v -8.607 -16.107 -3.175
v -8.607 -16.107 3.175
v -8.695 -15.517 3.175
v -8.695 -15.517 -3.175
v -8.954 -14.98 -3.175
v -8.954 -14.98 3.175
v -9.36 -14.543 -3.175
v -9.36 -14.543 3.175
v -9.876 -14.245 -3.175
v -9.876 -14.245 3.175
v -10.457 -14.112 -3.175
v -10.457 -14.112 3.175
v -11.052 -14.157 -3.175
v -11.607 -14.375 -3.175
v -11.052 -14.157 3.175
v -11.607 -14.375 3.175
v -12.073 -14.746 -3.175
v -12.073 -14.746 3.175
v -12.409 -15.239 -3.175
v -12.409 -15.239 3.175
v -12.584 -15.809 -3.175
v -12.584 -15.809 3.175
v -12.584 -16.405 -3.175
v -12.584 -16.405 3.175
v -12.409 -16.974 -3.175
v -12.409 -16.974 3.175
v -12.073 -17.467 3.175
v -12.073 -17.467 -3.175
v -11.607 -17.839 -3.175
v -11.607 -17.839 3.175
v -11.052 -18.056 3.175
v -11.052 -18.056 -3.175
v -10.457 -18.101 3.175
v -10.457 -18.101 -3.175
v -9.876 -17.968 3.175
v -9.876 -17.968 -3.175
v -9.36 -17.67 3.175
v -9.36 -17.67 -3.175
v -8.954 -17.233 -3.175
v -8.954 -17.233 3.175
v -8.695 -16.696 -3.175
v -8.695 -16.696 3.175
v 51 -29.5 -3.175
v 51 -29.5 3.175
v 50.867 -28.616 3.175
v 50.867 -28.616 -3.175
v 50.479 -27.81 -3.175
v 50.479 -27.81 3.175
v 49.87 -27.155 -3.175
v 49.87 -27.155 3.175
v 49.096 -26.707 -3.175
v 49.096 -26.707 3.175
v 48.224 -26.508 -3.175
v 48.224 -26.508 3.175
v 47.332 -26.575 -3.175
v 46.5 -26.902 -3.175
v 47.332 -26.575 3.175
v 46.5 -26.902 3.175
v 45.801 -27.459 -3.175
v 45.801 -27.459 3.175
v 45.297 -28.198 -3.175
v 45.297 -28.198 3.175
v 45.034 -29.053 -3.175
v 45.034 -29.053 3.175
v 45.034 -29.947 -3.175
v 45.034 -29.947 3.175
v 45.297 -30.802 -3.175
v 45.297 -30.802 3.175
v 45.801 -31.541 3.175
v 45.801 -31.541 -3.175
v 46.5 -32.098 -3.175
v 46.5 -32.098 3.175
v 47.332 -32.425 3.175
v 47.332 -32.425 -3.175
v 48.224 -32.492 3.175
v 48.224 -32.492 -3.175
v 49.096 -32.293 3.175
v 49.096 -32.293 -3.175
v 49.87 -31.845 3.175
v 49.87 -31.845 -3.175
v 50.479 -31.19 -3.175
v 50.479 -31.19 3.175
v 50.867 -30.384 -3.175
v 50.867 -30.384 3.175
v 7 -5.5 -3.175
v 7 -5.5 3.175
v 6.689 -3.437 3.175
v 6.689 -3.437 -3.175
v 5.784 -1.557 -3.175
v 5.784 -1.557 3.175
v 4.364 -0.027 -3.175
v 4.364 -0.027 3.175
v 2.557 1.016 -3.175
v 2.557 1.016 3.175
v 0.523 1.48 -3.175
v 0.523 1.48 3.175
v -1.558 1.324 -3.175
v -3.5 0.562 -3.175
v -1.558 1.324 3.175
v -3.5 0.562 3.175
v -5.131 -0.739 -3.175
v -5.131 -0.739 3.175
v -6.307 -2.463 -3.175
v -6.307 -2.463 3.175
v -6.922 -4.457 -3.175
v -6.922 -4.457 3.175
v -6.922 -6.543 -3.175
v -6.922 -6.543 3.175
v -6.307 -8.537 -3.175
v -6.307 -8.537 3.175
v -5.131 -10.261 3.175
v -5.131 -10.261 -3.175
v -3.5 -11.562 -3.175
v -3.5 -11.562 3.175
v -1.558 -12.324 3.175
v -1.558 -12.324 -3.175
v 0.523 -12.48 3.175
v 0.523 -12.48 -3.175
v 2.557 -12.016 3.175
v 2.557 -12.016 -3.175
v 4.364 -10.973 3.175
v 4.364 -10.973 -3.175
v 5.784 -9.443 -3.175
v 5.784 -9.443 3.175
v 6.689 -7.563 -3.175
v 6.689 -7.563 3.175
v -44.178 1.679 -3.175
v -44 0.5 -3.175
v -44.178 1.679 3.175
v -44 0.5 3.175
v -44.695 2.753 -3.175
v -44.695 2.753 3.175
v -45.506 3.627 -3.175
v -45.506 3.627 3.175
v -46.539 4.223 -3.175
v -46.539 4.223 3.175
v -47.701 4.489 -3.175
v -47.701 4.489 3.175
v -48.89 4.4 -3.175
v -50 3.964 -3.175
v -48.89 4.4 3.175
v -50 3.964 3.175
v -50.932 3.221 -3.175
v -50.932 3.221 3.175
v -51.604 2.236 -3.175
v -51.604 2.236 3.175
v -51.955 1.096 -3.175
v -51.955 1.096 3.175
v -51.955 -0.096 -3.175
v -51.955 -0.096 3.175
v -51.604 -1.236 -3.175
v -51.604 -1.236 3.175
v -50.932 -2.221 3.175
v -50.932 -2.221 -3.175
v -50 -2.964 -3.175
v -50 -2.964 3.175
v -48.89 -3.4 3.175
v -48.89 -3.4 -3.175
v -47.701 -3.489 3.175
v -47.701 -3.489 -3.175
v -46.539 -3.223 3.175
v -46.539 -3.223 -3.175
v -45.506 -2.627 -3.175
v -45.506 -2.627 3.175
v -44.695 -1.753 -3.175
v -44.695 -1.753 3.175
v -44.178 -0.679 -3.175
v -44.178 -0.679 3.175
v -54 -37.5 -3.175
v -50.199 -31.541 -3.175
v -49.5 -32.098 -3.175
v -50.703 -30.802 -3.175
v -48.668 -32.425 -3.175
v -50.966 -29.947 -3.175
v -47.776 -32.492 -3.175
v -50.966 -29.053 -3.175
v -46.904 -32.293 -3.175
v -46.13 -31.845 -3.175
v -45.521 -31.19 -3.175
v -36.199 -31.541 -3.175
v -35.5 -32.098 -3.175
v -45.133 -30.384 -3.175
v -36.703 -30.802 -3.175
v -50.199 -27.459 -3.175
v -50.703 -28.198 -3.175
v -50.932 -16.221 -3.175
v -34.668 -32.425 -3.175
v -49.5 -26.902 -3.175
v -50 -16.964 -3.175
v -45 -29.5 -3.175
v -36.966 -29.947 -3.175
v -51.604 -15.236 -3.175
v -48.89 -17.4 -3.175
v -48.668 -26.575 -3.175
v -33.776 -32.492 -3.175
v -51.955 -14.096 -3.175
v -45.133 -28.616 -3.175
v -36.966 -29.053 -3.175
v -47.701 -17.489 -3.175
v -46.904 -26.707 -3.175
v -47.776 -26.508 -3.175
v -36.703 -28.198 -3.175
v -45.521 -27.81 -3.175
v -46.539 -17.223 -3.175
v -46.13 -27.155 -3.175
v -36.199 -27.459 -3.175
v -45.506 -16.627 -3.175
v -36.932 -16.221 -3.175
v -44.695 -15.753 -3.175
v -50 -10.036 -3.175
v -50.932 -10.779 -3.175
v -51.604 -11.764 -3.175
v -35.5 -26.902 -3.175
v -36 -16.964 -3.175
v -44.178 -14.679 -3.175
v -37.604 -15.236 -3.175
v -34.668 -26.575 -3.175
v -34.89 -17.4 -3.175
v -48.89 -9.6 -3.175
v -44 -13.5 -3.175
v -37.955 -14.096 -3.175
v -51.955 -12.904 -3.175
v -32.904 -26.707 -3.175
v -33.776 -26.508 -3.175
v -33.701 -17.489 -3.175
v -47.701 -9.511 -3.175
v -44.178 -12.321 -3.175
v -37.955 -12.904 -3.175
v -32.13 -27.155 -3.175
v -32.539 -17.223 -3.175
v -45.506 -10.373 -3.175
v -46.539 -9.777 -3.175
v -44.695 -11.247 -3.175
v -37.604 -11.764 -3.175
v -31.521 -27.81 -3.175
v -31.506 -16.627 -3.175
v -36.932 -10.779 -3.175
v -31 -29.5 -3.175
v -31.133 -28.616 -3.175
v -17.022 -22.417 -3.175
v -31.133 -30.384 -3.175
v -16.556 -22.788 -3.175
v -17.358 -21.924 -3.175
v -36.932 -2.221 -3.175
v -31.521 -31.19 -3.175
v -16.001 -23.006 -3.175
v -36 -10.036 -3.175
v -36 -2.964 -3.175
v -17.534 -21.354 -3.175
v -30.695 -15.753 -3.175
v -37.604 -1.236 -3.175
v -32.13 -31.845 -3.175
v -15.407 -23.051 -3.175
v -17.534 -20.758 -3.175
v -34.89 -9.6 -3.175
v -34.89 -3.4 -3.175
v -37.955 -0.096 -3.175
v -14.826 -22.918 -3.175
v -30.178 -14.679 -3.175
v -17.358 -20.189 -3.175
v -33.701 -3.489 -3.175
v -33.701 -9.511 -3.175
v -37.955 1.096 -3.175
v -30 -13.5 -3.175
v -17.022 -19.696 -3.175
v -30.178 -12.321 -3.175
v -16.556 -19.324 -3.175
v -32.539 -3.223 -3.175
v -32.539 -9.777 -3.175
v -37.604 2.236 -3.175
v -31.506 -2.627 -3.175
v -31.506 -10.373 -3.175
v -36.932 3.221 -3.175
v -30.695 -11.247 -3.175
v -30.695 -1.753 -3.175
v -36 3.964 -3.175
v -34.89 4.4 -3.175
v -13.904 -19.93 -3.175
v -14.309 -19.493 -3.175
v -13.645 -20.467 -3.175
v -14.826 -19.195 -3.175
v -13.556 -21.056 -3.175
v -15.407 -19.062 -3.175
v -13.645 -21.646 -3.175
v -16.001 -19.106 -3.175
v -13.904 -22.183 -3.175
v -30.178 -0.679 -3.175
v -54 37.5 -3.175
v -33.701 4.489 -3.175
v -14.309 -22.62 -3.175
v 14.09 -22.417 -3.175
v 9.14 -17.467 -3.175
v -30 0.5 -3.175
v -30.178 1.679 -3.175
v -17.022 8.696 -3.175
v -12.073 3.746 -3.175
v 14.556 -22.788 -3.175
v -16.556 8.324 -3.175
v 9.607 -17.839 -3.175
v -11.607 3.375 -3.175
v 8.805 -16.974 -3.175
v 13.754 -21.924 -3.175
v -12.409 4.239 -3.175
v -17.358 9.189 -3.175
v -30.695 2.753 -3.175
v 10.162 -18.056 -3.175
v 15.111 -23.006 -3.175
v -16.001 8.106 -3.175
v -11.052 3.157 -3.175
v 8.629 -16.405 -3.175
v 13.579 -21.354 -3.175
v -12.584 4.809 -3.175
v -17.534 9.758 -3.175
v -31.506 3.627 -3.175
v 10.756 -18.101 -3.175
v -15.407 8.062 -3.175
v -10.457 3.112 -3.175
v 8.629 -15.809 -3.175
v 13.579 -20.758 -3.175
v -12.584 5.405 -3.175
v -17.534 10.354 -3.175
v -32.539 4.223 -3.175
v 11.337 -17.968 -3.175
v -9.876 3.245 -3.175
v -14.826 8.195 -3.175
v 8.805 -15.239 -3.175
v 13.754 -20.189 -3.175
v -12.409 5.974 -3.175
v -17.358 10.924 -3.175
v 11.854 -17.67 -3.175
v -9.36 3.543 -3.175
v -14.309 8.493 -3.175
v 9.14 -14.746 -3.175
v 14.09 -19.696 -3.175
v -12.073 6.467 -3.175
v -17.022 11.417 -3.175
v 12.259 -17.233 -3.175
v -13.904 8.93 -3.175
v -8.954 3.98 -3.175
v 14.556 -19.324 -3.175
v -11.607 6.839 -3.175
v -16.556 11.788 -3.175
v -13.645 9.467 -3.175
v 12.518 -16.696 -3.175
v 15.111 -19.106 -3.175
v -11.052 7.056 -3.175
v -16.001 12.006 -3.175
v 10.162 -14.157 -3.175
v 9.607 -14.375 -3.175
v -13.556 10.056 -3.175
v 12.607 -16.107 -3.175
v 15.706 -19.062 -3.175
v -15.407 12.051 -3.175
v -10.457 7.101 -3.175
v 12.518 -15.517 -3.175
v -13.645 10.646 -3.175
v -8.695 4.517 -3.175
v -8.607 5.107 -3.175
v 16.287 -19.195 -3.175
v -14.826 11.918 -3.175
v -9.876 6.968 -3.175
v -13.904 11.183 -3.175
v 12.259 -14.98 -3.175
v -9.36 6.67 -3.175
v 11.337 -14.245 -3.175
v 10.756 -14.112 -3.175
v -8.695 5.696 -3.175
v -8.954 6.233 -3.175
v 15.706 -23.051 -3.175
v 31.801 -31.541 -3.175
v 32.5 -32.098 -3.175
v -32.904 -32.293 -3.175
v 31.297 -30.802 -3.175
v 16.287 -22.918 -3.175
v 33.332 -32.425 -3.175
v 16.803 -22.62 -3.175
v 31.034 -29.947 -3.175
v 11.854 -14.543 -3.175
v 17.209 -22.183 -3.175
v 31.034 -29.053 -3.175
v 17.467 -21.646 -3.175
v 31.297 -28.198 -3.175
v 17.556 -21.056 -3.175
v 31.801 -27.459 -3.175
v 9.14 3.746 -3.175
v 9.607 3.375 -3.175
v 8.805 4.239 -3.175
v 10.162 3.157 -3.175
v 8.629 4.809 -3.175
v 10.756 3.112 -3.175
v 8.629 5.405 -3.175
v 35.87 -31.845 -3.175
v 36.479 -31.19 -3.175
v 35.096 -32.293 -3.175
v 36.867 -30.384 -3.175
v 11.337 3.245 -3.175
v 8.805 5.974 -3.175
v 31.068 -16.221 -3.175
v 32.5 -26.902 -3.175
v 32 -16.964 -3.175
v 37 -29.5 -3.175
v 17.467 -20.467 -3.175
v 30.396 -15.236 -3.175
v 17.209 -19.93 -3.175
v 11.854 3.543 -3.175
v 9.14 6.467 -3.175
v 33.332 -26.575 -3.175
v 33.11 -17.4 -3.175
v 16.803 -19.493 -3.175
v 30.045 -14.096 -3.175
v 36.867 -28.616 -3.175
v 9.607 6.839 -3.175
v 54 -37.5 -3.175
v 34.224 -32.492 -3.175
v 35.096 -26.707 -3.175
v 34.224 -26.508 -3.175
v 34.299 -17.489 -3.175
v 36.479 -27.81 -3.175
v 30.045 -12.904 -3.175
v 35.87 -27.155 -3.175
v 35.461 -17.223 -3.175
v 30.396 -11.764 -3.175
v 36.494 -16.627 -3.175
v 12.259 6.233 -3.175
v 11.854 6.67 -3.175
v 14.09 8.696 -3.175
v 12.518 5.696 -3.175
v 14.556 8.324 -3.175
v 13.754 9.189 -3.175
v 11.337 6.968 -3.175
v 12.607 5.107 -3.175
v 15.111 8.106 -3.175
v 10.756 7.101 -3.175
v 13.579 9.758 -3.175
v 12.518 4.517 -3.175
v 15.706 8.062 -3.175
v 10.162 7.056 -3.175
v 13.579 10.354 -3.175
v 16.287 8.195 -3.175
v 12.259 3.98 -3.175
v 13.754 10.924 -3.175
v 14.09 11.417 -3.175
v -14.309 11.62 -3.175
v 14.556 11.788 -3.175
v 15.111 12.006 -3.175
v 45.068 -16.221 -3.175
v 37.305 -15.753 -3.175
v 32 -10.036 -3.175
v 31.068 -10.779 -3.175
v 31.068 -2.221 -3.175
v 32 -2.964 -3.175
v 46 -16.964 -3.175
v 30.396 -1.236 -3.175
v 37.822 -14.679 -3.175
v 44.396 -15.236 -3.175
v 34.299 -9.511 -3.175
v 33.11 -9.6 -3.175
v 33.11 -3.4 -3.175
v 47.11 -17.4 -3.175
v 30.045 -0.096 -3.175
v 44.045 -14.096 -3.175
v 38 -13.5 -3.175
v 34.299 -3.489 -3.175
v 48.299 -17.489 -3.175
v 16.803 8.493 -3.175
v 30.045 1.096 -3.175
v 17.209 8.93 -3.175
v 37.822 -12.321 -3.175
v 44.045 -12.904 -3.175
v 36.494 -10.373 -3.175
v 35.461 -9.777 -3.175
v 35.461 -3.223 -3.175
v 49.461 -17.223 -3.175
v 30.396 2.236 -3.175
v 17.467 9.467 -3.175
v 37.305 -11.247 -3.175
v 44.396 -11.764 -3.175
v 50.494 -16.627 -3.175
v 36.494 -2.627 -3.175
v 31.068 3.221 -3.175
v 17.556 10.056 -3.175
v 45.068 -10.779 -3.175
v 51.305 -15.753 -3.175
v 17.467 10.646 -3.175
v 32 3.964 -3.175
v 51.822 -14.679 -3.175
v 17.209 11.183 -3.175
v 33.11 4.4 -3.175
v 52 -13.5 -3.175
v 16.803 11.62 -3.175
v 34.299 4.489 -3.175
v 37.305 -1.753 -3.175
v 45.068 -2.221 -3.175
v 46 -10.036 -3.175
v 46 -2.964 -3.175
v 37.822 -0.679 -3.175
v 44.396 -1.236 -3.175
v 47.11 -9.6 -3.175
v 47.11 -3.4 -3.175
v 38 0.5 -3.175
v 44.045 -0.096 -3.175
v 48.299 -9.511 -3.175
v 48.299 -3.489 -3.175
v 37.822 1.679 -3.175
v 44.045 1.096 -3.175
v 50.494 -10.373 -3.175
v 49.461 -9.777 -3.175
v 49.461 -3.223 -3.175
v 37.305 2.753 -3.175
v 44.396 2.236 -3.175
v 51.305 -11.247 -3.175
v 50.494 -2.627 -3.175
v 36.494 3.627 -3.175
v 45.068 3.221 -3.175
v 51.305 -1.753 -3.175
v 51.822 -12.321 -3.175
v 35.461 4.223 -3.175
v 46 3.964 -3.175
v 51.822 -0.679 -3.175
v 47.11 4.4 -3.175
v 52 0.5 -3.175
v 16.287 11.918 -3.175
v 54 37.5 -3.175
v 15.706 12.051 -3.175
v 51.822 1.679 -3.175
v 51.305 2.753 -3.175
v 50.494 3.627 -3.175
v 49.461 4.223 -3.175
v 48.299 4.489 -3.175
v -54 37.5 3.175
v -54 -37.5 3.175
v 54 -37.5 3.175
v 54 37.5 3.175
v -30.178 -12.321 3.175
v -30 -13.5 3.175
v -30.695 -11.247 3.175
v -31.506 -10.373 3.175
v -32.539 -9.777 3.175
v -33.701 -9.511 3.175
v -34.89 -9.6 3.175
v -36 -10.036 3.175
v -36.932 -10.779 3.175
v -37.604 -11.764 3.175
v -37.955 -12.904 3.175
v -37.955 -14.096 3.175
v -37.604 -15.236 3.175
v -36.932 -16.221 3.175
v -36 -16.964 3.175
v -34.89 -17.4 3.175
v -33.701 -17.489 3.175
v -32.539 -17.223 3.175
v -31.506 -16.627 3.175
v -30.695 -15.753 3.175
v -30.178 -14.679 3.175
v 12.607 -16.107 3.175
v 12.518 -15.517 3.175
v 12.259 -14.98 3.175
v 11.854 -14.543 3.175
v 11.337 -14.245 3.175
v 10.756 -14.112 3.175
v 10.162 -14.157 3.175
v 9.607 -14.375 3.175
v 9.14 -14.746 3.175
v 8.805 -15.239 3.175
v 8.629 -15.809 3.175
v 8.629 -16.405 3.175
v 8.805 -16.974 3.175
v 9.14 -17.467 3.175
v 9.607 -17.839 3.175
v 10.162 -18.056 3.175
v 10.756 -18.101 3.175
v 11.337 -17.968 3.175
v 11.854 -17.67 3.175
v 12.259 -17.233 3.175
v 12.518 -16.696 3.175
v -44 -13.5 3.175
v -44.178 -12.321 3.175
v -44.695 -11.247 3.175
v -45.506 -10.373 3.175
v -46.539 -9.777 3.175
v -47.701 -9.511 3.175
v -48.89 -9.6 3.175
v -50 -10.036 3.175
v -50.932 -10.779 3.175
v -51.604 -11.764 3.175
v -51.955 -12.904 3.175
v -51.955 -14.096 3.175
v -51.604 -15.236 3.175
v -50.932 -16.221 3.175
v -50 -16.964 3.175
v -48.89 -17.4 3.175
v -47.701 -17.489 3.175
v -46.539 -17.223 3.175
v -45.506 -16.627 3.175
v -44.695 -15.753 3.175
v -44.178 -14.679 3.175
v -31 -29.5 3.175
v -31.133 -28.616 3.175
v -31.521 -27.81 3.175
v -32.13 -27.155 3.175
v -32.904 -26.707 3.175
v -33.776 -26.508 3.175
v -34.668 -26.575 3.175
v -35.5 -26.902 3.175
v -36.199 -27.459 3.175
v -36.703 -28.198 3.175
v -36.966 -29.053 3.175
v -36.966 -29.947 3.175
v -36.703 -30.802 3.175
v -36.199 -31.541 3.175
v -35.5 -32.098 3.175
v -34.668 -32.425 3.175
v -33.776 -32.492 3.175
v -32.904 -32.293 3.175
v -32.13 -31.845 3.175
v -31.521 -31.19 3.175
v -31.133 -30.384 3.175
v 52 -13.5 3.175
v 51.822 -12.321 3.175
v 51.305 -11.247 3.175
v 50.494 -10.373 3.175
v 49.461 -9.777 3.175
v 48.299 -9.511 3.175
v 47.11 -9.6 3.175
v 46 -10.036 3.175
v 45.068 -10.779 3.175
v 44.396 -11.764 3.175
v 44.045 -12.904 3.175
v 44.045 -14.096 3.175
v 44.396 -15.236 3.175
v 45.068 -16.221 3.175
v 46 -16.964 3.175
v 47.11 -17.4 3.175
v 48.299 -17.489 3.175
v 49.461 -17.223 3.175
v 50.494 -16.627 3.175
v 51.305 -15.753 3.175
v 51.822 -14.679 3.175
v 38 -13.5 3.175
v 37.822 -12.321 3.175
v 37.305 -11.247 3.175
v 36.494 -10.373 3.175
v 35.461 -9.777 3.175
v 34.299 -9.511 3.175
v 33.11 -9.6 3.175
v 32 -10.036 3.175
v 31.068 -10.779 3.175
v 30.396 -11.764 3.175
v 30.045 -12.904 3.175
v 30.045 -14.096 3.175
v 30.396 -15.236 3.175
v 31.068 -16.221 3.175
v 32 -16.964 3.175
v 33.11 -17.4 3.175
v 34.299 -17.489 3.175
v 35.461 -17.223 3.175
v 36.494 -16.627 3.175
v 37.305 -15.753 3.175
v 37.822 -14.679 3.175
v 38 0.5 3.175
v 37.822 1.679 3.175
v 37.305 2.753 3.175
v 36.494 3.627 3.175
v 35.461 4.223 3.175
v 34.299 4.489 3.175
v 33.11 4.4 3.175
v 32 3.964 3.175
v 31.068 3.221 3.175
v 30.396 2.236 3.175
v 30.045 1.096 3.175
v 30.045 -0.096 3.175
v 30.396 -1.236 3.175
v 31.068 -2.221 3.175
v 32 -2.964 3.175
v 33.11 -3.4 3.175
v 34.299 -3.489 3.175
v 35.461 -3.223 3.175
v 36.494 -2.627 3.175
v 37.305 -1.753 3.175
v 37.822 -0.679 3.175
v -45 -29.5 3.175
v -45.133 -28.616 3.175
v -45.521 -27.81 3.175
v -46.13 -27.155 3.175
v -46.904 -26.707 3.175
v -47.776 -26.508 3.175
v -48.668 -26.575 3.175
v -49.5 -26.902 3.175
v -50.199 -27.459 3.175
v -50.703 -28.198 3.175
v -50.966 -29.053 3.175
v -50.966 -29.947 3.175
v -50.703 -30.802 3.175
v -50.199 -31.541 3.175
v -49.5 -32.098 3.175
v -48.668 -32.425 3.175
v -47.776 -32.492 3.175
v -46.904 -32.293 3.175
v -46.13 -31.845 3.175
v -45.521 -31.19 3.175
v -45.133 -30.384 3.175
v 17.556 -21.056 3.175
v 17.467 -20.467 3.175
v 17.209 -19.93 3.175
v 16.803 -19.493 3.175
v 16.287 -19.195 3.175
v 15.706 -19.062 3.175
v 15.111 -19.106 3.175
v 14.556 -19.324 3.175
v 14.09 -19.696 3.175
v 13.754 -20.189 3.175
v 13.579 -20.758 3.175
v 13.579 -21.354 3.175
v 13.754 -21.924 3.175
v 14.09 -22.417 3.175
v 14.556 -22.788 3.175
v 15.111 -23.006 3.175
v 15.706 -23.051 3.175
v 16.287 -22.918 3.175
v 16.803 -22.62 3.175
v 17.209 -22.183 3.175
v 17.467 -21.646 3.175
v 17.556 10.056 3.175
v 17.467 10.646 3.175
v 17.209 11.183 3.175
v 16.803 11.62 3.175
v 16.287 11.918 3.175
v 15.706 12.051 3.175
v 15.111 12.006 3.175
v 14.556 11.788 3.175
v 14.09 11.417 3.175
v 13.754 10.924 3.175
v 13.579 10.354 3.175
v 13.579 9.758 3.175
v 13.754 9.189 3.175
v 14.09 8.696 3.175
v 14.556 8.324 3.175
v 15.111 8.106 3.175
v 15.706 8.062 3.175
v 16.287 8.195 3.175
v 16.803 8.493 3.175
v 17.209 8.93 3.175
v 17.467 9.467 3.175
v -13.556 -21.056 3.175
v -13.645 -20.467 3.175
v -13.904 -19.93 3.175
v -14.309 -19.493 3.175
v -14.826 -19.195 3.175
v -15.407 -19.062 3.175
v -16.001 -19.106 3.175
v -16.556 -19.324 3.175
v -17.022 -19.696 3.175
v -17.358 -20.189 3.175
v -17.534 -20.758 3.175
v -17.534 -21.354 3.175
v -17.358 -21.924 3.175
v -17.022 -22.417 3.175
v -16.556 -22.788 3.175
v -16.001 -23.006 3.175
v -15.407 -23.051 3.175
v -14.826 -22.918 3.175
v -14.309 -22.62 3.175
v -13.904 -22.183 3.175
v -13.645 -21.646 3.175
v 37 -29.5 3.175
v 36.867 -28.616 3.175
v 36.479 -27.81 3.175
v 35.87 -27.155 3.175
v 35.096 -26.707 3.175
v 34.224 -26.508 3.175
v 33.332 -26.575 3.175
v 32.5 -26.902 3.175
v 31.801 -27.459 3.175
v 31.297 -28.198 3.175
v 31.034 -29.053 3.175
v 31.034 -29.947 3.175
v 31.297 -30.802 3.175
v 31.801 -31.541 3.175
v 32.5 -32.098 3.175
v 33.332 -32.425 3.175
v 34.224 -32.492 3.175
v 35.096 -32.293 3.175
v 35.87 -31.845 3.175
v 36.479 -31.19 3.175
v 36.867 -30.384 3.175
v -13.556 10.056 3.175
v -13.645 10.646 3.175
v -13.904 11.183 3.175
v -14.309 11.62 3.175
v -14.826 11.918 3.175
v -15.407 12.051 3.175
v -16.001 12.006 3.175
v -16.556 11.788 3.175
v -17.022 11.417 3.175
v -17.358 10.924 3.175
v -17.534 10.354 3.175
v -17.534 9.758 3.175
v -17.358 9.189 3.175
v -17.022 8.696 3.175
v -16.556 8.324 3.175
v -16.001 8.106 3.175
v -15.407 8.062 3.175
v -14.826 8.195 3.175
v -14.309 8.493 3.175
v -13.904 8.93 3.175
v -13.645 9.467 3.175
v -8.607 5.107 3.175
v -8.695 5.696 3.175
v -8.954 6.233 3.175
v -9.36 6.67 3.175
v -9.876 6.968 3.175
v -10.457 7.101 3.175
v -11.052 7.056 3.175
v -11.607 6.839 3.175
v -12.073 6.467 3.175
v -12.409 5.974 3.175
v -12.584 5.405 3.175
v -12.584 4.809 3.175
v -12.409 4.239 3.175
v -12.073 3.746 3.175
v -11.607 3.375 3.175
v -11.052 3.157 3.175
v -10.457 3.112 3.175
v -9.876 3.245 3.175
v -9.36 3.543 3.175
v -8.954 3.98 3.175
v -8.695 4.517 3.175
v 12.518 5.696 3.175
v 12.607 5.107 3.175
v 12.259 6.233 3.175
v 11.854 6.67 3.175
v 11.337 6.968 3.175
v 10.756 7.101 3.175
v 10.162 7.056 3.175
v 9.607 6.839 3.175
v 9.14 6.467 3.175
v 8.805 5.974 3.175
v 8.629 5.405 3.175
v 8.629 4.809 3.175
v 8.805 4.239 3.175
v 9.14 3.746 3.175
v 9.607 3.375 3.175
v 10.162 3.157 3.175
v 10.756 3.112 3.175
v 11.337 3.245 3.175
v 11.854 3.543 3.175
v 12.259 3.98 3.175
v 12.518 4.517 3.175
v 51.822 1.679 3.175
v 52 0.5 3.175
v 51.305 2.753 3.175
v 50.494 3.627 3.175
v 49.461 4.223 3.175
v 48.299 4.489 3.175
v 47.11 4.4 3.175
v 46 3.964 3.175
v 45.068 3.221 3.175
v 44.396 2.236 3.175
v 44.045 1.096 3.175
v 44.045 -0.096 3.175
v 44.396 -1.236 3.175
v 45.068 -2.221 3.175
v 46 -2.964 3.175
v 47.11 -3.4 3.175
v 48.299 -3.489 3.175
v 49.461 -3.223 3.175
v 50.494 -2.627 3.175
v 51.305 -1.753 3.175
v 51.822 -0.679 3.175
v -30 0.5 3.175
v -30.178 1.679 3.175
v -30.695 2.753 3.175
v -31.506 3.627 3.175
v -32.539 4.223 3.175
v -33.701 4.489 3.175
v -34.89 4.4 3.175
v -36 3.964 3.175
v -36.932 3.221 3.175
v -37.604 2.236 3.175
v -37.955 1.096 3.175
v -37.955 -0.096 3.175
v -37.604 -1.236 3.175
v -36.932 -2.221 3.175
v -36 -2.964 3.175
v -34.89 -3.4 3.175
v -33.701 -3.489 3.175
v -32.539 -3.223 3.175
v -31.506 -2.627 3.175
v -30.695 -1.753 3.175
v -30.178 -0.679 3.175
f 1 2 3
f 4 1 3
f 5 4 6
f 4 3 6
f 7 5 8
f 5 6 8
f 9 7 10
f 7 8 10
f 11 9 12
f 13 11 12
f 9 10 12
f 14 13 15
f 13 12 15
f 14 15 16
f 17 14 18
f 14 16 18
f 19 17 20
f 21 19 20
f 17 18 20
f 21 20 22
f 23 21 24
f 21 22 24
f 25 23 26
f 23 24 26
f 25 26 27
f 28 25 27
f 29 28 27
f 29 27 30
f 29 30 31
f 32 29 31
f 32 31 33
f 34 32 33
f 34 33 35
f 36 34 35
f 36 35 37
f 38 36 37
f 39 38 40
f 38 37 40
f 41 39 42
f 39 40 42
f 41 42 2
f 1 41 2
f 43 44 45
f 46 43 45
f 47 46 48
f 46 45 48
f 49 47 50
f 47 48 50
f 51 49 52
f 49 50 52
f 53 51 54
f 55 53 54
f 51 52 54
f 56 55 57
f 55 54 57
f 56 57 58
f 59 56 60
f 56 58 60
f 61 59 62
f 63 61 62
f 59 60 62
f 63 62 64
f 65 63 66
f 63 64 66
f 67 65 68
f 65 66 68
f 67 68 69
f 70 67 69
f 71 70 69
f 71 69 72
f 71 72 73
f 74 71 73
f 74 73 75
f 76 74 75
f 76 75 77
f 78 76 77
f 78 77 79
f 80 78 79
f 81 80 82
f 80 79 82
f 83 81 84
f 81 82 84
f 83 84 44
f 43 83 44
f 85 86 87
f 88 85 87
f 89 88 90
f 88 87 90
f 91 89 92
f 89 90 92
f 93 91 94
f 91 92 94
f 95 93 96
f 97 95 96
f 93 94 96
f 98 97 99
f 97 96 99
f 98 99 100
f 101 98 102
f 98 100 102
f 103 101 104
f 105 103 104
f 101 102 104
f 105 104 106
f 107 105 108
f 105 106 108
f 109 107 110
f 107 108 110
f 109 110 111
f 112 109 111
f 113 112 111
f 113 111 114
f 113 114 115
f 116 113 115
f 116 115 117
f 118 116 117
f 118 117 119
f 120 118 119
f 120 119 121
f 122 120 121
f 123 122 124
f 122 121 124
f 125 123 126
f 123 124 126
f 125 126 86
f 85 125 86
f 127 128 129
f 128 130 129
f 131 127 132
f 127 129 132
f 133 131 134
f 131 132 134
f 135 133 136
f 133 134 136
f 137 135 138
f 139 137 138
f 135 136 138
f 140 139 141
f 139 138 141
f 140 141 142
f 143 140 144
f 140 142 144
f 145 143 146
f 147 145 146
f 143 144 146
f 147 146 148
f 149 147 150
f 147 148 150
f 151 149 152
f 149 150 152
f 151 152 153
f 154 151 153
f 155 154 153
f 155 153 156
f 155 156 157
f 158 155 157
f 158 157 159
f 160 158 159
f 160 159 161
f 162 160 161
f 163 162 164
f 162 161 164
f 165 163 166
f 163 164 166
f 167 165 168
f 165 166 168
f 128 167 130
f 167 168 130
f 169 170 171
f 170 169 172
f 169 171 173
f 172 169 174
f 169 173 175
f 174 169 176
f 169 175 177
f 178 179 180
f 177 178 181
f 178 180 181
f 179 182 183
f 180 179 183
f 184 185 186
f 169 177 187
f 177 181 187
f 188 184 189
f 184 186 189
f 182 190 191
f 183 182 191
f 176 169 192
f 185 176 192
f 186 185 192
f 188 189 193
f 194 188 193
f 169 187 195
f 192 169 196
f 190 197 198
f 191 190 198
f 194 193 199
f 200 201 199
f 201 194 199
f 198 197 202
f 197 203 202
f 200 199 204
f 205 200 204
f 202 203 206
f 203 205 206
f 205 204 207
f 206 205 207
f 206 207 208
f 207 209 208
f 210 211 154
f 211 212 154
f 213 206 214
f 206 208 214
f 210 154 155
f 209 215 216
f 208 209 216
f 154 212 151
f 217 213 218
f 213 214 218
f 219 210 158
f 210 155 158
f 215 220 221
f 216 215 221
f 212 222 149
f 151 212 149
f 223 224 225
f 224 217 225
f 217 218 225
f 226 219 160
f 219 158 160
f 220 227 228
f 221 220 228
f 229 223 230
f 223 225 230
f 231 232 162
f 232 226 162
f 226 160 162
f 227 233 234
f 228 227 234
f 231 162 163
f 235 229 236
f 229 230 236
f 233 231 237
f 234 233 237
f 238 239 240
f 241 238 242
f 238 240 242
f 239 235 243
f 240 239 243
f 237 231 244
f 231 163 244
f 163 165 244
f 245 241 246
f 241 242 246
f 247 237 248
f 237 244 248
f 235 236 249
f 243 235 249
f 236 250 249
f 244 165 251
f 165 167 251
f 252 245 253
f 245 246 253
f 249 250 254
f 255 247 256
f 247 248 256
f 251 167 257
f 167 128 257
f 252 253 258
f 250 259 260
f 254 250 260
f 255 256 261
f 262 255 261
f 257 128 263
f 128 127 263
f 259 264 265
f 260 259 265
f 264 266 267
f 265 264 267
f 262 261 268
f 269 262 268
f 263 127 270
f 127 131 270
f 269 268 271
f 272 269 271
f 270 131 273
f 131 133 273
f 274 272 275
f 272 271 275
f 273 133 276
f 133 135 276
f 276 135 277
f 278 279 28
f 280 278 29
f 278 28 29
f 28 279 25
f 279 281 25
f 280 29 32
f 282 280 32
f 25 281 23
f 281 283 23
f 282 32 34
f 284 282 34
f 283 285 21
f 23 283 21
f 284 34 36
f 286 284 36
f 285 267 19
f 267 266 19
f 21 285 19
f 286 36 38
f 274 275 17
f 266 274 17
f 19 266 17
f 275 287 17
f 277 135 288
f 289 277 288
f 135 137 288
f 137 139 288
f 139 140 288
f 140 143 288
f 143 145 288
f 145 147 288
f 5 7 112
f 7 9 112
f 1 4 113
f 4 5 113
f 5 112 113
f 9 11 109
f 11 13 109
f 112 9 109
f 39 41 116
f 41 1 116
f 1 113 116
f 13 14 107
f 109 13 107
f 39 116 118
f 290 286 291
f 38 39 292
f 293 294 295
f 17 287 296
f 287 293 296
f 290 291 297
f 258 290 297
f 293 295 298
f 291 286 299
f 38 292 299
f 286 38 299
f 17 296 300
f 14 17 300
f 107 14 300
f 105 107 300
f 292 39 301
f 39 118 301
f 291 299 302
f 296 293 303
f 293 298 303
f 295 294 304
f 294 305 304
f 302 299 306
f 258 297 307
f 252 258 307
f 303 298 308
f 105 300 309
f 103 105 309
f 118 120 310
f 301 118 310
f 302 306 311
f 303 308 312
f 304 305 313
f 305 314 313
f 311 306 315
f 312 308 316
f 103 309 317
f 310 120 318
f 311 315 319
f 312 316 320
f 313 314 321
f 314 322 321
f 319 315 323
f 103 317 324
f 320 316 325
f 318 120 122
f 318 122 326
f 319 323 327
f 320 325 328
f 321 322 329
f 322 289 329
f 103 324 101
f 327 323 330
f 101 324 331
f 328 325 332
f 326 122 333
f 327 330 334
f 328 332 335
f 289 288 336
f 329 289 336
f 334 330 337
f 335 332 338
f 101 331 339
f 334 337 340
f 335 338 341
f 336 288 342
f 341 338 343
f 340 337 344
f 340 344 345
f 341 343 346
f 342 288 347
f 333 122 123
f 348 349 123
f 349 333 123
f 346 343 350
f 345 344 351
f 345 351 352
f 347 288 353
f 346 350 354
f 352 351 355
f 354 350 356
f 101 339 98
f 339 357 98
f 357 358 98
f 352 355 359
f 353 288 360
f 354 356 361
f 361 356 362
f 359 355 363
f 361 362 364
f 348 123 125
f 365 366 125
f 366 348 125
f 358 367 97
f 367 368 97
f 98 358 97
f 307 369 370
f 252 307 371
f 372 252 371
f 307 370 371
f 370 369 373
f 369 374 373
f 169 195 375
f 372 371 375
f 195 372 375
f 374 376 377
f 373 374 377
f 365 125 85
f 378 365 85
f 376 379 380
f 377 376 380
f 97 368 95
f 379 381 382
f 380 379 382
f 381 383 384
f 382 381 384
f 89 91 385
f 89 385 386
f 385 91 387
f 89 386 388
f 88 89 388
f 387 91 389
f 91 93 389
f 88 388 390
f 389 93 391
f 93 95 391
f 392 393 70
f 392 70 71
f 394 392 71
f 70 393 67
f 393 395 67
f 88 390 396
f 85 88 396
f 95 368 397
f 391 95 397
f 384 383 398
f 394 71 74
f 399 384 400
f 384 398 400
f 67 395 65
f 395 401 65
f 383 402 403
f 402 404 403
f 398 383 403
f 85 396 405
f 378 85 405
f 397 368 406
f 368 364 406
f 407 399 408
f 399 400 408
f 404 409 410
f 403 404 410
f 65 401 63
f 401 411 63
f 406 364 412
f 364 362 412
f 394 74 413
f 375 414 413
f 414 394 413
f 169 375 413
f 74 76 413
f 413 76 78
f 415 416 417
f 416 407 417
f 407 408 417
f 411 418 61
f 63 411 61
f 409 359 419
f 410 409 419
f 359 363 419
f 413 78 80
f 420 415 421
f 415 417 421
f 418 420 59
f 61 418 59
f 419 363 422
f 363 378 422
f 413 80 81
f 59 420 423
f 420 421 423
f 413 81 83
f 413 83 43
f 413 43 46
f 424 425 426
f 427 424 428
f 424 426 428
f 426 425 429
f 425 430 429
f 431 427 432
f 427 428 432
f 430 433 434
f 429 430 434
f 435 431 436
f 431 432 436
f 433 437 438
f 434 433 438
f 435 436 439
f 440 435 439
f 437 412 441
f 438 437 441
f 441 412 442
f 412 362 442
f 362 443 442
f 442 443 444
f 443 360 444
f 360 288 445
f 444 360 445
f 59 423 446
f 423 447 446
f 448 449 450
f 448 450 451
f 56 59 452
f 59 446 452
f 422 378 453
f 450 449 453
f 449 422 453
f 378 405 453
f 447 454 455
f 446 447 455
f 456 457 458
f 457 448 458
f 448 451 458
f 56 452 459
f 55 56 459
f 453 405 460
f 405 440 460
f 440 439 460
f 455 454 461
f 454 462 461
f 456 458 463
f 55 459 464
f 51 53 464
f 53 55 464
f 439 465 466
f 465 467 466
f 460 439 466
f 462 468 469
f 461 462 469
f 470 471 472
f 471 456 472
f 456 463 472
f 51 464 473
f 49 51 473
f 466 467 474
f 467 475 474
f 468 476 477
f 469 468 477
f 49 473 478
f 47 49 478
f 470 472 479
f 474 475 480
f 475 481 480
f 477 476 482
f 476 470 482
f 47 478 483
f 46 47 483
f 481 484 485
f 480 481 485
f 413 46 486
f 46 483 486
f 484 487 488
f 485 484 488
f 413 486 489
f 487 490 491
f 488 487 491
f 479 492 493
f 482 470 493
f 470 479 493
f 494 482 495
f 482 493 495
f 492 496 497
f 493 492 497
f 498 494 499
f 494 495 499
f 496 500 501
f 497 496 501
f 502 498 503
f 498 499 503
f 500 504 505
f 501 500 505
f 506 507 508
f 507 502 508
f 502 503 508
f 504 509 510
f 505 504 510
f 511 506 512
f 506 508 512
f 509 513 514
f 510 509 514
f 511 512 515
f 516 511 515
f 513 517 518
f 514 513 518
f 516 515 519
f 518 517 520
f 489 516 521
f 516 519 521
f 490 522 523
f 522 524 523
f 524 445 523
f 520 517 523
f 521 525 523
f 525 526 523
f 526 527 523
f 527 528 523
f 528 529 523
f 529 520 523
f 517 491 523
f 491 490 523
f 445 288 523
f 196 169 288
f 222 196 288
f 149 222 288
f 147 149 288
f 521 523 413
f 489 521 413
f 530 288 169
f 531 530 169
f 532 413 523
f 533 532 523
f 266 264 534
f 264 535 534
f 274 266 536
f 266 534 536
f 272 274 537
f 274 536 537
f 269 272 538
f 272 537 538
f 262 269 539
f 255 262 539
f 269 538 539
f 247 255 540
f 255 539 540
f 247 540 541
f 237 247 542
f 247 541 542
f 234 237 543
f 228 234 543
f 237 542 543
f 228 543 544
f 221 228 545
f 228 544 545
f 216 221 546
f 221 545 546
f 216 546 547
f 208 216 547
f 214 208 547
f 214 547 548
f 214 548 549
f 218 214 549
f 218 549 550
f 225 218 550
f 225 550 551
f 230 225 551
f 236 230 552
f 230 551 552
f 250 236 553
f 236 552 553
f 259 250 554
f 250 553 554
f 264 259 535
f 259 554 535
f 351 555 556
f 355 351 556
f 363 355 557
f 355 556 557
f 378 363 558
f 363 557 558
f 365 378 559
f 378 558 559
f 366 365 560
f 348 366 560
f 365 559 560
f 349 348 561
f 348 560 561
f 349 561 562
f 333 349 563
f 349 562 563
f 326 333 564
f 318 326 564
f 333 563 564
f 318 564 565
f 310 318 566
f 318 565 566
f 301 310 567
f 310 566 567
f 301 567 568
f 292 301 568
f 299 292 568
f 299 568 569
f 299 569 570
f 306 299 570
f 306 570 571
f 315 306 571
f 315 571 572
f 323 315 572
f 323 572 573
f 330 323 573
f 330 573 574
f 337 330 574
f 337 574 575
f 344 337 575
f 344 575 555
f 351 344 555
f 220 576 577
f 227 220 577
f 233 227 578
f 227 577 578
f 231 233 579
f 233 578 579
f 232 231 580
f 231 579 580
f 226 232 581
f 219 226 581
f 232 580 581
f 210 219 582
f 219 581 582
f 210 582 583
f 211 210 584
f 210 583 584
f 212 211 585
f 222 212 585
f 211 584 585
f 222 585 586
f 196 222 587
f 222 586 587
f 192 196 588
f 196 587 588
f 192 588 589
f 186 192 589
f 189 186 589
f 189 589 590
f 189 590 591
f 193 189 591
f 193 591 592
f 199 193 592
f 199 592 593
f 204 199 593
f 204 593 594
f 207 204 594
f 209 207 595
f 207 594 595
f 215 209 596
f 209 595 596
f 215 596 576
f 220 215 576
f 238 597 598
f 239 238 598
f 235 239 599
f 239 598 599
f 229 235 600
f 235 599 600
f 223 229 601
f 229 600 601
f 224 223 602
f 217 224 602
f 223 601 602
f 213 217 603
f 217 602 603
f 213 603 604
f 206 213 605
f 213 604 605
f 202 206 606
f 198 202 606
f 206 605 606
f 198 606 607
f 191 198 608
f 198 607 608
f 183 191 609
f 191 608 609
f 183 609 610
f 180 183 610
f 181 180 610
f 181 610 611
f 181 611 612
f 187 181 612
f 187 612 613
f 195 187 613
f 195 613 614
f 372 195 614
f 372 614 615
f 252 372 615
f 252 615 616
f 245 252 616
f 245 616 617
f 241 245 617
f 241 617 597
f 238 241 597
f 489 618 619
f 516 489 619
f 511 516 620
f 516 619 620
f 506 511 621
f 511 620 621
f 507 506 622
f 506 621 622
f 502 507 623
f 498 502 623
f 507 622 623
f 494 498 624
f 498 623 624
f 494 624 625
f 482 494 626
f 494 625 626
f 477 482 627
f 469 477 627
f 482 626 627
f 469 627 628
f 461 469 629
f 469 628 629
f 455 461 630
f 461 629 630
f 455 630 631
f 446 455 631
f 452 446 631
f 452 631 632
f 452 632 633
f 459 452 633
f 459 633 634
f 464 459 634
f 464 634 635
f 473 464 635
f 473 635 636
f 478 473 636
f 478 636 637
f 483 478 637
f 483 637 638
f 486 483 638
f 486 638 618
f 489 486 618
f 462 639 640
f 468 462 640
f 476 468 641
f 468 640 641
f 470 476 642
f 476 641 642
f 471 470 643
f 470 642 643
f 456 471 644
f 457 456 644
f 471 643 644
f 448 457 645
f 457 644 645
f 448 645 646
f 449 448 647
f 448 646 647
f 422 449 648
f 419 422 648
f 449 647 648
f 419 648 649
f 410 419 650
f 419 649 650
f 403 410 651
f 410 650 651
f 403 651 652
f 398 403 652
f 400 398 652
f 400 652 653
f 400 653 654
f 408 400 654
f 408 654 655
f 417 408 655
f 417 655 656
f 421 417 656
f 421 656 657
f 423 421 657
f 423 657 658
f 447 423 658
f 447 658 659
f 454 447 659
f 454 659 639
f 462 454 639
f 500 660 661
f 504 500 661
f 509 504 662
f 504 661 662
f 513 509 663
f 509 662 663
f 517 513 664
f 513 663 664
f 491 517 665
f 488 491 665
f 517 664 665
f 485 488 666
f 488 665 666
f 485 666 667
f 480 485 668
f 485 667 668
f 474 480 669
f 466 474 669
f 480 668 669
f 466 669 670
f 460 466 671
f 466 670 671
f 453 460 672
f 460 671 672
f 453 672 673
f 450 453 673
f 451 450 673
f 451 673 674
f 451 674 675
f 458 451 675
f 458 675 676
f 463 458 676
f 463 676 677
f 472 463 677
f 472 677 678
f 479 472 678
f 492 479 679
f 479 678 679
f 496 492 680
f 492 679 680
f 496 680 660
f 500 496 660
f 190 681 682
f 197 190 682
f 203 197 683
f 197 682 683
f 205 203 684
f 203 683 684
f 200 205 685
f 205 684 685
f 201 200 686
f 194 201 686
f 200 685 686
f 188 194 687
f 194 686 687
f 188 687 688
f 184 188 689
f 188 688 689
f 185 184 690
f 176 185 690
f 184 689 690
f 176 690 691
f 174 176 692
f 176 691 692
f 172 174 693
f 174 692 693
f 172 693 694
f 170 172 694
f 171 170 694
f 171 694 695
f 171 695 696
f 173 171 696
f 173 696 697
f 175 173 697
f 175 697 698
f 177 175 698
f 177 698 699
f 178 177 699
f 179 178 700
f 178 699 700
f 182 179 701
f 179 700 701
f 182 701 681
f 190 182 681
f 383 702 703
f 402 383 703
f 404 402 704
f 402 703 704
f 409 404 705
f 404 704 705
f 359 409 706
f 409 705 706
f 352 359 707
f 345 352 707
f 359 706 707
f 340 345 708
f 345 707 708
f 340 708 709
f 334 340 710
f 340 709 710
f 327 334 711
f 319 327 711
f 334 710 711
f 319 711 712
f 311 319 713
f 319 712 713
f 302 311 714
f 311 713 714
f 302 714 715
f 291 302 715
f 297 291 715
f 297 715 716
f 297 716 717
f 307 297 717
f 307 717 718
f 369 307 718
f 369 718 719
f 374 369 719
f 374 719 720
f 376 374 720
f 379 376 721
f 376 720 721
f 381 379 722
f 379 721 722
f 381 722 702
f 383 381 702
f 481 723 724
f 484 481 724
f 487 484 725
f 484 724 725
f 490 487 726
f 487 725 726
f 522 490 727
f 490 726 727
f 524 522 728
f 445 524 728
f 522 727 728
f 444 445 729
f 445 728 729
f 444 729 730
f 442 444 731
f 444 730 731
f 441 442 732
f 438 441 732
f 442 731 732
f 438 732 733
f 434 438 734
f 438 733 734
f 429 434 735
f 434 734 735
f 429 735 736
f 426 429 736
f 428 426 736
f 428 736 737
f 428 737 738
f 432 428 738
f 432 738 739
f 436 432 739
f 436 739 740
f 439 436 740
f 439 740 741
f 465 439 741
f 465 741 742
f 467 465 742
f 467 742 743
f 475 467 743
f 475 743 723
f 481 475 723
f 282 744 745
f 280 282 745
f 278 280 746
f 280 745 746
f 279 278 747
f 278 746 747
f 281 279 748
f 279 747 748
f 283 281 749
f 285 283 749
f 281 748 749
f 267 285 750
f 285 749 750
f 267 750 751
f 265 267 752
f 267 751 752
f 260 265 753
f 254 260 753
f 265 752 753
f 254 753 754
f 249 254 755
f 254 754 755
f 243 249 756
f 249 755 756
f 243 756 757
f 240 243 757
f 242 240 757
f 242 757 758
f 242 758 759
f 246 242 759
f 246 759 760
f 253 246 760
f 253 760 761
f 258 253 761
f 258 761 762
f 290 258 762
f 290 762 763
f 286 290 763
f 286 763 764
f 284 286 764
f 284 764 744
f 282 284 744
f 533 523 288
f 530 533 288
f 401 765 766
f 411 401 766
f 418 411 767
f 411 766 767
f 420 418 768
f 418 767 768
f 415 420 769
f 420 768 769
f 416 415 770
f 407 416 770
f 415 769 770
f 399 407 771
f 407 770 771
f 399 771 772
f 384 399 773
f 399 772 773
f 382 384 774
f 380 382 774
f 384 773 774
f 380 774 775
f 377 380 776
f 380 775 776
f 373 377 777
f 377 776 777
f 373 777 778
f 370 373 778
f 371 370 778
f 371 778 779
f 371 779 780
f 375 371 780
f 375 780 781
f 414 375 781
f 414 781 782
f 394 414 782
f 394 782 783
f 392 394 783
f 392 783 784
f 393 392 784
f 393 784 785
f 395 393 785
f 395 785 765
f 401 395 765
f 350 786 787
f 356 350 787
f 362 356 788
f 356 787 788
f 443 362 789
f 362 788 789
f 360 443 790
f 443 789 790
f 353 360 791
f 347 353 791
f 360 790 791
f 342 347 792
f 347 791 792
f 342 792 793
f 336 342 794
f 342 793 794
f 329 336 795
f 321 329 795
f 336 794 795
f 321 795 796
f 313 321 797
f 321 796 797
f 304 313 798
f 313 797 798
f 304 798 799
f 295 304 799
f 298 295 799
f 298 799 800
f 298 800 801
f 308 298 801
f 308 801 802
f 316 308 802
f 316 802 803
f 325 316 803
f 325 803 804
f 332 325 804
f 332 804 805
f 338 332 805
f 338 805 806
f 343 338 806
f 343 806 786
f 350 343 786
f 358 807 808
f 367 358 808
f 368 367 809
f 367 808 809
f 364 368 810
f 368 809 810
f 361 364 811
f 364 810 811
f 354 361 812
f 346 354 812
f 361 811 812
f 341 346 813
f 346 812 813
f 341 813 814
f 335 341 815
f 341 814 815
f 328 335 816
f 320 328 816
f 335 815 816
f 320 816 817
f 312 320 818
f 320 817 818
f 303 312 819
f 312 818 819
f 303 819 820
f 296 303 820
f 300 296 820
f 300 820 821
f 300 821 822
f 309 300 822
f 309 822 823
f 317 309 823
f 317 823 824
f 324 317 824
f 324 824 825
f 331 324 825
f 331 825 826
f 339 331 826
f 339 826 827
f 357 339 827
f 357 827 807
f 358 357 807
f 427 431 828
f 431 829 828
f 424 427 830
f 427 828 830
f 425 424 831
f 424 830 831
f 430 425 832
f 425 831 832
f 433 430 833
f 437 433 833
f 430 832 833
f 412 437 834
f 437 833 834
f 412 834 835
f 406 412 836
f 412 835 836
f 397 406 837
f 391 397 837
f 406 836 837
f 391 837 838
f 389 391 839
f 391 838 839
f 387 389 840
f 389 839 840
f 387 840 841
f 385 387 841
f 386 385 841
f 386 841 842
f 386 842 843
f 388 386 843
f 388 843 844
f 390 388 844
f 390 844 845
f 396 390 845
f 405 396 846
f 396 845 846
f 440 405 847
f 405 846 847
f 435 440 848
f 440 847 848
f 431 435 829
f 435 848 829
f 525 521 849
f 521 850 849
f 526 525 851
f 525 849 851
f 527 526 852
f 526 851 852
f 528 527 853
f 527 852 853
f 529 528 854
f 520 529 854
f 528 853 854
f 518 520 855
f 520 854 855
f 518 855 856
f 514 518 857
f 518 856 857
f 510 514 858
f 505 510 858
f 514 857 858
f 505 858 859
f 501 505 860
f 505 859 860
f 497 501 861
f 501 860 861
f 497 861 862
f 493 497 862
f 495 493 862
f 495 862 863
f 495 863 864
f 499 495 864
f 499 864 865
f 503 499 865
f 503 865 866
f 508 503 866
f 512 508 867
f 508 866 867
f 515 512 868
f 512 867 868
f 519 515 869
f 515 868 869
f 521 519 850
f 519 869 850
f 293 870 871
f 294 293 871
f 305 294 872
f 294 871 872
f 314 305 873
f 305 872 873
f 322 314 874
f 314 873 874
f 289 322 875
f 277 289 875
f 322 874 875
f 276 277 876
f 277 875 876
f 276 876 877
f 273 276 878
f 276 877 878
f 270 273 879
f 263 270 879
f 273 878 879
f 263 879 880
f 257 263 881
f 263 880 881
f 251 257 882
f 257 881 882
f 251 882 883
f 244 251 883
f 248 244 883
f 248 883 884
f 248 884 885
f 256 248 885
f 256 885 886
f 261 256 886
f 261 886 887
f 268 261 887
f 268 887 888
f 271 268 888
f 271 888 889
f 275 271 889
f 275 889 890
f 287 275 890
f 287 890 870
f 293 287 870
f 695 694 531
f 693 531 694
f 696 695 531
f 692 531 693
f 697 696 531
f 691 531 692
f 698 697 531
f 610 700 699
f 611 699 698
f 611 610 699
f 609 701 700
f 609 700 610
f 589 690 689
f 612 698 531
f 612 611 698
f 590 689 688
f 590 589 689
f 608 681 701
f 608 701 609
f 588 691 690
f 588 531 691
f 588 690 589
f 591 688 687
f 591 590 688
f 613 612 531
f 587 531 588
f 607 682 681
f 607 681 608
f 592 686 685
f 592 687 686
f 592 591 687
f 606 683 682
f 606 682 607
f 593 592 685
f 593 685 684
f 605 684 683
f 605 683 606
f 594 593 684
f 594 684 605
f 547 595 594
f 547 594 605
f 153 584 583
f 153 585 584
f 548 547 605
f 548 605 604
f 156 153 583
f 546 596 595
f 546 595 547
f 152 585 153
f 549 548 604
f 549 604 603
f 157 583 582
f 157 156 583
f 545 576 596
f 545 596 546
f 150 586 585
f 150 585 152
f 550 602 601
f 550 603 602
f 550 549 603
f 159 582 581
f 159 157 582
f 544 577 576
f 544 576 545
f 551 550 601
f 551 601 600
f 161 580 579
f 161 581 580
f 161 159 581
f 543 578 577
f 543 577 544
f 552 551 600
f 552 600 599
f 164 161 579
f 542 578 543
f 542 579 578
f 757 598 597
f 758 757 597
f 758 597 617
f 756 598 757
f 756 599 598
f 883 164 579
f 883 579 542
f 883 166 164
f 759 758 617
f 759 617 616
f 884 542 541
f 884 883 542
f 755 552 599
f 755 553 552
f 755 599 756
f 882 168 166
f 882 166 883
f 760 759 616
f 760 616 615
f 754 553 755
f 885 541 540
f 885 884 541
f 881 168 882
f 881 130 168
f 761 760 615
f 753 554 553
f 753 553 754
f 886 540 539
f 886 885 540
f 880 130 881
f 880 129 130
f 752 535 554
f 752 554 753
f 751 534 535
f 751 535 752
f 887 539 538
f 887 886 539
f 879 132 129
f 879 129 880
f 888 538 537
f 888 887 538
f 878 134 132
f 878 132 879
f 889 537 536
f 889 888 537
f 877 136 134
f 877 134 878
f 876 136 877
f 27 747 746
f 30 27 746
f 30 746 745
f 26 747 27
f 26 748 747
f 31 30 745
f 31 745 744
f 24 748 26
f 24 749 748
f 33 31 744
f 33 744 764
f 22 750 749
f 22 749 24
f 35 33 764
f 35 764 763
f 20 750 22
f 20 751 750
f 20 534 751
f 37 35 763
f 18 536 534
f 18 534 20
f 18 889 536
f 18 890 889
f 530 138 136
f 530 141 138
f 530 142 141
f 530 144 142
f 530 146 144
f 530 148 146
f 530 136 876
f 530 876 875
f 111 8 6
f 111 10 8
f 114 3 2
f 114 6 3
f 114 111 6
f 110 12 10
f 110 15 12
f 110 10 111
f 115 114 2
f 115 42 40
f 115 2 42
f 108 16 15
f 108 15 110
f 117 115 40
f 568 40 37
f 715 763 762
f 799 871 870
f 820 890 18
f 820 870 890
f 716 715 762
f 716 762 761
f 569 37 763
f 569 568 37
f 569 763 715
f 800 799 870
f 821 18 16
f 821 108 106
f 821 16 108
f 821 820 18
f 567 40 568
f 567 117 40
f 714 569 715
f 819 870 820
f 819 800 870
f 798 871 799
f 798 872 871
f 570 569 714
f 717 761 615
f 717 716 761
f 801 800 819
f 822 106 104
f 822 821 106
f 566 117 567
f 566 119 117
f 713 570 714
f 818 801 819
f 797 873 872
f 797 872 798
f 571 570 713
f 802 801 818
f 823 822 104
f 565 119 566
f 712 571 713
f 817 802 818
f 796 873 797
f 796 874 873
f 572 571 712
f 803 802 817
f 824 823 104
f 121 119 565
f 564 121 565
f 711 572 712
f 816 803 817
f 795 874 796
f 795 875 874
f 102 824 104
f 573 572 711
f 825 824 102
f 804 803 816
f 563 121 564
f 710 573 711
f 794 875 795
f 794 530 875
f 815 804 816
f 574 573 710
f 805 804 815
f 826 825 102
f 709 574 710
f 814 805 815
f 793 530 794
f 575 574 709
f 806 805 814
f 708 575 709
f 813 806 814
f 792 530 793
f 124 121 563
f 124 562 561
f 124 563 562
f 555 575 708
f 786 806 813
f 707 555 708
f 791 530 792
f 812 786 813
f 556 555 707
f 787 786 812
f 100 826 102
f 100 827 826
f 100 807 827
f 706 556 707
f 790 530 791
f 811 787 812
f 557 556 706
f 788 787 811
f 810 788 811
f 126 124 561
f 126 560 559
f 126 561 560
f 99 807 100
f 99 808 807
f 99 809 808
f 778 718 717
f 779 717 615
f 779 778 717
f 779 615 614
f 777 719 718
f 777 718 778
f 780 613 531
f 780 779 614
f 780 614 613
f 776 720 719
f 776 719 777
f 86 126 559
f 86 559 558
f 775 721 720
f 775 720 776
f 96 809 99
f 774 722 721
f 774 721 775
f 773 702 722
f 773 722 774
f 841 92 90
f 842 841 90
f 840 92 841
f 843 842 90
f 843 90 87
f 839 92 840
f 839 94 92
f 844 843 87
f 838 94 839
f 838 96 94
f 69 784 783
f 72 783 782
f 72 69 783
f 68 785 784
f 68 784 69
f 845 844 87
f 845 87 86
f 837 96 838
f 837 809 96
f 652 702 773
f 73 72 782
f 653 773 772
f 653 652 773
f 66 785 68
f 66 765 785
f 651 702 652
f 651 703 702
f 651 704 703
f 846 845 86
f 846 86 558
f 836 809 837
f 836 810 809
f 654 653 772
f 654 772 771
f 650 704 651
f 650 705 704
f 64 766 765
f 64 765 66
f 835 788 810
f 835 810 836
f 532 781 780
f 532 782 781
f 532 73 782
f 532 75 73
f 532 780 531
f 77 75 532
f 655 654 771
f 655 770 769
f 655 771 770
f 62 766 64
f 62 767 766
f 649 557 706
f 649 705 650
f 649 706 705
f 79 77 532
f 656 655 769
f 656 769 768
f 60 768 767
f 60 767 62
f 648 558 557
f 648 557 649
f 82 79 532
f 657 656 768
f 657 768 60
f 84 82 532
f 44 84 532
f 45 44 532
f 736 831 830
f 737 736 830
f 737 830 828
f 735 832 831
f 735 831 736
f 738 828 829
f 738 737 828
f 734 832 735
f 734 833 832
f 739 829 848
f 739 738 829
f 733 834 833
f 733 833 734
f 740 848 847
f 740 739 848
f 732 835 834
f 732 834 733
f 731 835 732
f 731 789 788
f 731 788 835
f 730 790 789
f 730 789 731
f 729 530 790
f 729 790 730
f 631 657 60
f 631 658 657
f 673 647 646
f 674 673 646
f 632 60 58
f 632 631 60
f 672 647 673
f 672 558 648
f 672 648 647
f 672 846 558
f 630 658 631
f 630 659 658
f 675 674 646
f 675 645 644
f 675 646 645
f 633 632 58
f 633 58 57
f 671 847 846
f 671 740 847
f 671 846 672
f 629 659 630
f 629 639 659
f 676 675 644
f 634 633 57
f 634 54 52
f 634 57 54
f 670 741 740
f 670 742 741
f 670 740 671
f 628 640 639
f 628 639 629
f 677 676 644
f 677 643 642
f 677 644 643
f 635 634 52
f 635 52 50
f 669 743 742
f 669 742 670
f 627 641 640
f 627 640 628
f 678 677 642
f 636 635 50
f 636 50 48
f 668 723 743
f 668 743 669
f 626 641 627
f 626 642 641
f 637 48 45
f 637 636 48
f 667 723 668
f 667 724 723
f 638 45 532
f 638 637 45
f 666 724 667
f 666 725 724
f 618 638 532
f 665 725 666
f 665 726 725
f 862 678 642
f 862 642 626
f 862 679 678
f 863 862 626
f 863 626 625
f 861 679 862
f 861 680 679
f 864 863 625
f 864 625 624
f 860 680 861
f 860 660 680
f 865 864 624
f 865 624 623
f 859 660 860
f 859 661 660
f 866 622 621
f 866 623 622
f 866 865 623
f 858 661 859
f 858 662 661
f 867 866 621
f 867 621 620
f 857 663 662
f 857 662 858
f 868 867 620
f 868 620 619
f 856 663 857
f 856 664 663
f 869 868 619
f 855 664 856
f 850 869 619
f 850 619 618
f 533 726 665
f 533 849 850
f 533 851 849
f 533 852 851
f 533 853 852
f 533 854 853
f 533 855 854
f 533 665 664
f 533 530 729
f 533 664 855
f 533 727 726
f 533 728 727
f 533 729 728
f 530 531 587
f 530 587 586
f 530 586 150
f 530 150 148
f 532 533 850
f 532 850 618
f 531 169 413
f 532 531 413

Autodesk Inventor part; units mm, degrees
ref_plane "YZ Plane" through (0, 0, 0) normal (1, 0, 0) x (0, 1, 0)
ref_plane "XZ Plane" through (0, 0, 0) normal (0, 1, 0) x (-1, 0, 0)
ref_plane "XY Plane" through (0, 0, 0) normal (0, 0, 1) x (1, 0, 0)
sketch "Sketch1" plane through (0, 0, 0) normal (0, 0, 1) x (1, 0, 0)
  line L0 (-54, -37.5) -> (54, -37.5)
  line L1 (54, -37.5) -> (54, 37.5)
  line L2 (54, 37.5) -> (-54, 37.5)
  line L3 (-54, 37.5) -> (-54, -37.5)
  line L4 (-54, -37.5) -> (54, 37.5) construction
  line L5 (54, -37.5) -> (-54, 37.5) construction
  point P0 (0, 0)
  dimension "d0" = 108
  dimension "d1" = 75
extrude "Extrusion1" add sketch "Sketch1" along normal mid plane 6.35
sketch "Sketch3" plane through (0, 0, 3.175) normal (0, 0, 1) x (1, 0, 0)
  circle A0 centre (0, -5.5) radius 7
  line L0 (-54, -37.5) -> (54, -37.5) construction
  circle A1 centre (-10.6066, 5.1066) radius 2
  line L1 (0, -5.5) -> (-54, -5.5) construction
  line L2 (-54, -37.5) -> (-54, 37.5) construction
  line L3 (0, -5.5) -> (-10.6066, 5.1066) construction
  circle A2 centre (-10.6066, -16.1066) radius 2
  circle A3 centre (10.6066, -16.1066) radius 2
  circle A4 centre (10.6066, 5.1066) radius 2
  line L4 (0, -5.5) -> (-15.5563, 10.0563) construction
  circle A5 centre (-15.5563, 10.0563) radius 2
  circle A6 centre (-15.5563, -21.0563) radius 2
  circle A7 centre (15.5563, -21.0563) radius 2
  circle A8 centre (15.5563, 10.0563) radius 2
  circle A9 centre (-28.0623, -33.5623) radius 4.1
  point P0 (0, 0)
  point P1 (0, -37.5)
  dimension "d16" = 14
  dimension "d17" = 32
  dimension "d18" = 4
  dimension "d19" = 45
  dimension "d20" = 15
  dimension "d23" = 360
  dimension "d25" = 22
  dimension "d26" = 4
  dimension "d29" = 360
  dimension "d65" = 8.2
extrude "Extrusion3" cut sketch "Sketch3" against normal through all contours A0 | A1 | A2 | A3 | A4 | A5 | A6 | A7 | A8
sketch "Sketch5" plane through (0, 0, 3.175) normal (0, 0, 1) x (1, 0, 0)
  circle A0 centre (-48, -29.5) radius 3
  line L0 (-54, 37.5) -> (-54, -37.5) construction
  line L1 (-54, -37.5) -> (54, -37.5) construction
  circle A1 centre (-34, -29.5) radius 3
  circle A2 centre (-34, -13.5) radius 4
  circle A3 centre (-48, -13.5) radius 4
  circle A4 centre (-34, 0.5) radius 4
  circle A5 centre (-48, 0.5) radius 4
  line L2 (-54, 37.5) -> (54, 37.5) projected
  line L3 (0, 37.5) -> (0, -37.5) construction
  line L4 (54, -37.5) -> (-54, -37.5) construction
  circle A6 centre (48, -29.5) radius 3
  circle A7 centre (34, -29.5) radius 3
  circle A8 centre (34, -13.5) radius 4
  circle A9 centre (48, -13.5) radius 4
  circle A10 centre (34, 0.5) radius 4
  circle A11 centre (48, 0.5) radius 4
  point P0 (0, 0)
  dimension "d45" = 6
  dimension "d46" = 6
  dimension "d47" = 8
  dimension "d48" = 6
  dimension "d49" = 14
  dimension "d50" = 8
  dimension "d51" = 16
  dimension "d52" = 8
  dimension "d53" = 8
  dimension "d54" = 14
  dimension "d55" = 8
extrude "Extrusion5" cut sketch "Sketch5" against normal through all
properties part number "FirstStageMotorPlate"
